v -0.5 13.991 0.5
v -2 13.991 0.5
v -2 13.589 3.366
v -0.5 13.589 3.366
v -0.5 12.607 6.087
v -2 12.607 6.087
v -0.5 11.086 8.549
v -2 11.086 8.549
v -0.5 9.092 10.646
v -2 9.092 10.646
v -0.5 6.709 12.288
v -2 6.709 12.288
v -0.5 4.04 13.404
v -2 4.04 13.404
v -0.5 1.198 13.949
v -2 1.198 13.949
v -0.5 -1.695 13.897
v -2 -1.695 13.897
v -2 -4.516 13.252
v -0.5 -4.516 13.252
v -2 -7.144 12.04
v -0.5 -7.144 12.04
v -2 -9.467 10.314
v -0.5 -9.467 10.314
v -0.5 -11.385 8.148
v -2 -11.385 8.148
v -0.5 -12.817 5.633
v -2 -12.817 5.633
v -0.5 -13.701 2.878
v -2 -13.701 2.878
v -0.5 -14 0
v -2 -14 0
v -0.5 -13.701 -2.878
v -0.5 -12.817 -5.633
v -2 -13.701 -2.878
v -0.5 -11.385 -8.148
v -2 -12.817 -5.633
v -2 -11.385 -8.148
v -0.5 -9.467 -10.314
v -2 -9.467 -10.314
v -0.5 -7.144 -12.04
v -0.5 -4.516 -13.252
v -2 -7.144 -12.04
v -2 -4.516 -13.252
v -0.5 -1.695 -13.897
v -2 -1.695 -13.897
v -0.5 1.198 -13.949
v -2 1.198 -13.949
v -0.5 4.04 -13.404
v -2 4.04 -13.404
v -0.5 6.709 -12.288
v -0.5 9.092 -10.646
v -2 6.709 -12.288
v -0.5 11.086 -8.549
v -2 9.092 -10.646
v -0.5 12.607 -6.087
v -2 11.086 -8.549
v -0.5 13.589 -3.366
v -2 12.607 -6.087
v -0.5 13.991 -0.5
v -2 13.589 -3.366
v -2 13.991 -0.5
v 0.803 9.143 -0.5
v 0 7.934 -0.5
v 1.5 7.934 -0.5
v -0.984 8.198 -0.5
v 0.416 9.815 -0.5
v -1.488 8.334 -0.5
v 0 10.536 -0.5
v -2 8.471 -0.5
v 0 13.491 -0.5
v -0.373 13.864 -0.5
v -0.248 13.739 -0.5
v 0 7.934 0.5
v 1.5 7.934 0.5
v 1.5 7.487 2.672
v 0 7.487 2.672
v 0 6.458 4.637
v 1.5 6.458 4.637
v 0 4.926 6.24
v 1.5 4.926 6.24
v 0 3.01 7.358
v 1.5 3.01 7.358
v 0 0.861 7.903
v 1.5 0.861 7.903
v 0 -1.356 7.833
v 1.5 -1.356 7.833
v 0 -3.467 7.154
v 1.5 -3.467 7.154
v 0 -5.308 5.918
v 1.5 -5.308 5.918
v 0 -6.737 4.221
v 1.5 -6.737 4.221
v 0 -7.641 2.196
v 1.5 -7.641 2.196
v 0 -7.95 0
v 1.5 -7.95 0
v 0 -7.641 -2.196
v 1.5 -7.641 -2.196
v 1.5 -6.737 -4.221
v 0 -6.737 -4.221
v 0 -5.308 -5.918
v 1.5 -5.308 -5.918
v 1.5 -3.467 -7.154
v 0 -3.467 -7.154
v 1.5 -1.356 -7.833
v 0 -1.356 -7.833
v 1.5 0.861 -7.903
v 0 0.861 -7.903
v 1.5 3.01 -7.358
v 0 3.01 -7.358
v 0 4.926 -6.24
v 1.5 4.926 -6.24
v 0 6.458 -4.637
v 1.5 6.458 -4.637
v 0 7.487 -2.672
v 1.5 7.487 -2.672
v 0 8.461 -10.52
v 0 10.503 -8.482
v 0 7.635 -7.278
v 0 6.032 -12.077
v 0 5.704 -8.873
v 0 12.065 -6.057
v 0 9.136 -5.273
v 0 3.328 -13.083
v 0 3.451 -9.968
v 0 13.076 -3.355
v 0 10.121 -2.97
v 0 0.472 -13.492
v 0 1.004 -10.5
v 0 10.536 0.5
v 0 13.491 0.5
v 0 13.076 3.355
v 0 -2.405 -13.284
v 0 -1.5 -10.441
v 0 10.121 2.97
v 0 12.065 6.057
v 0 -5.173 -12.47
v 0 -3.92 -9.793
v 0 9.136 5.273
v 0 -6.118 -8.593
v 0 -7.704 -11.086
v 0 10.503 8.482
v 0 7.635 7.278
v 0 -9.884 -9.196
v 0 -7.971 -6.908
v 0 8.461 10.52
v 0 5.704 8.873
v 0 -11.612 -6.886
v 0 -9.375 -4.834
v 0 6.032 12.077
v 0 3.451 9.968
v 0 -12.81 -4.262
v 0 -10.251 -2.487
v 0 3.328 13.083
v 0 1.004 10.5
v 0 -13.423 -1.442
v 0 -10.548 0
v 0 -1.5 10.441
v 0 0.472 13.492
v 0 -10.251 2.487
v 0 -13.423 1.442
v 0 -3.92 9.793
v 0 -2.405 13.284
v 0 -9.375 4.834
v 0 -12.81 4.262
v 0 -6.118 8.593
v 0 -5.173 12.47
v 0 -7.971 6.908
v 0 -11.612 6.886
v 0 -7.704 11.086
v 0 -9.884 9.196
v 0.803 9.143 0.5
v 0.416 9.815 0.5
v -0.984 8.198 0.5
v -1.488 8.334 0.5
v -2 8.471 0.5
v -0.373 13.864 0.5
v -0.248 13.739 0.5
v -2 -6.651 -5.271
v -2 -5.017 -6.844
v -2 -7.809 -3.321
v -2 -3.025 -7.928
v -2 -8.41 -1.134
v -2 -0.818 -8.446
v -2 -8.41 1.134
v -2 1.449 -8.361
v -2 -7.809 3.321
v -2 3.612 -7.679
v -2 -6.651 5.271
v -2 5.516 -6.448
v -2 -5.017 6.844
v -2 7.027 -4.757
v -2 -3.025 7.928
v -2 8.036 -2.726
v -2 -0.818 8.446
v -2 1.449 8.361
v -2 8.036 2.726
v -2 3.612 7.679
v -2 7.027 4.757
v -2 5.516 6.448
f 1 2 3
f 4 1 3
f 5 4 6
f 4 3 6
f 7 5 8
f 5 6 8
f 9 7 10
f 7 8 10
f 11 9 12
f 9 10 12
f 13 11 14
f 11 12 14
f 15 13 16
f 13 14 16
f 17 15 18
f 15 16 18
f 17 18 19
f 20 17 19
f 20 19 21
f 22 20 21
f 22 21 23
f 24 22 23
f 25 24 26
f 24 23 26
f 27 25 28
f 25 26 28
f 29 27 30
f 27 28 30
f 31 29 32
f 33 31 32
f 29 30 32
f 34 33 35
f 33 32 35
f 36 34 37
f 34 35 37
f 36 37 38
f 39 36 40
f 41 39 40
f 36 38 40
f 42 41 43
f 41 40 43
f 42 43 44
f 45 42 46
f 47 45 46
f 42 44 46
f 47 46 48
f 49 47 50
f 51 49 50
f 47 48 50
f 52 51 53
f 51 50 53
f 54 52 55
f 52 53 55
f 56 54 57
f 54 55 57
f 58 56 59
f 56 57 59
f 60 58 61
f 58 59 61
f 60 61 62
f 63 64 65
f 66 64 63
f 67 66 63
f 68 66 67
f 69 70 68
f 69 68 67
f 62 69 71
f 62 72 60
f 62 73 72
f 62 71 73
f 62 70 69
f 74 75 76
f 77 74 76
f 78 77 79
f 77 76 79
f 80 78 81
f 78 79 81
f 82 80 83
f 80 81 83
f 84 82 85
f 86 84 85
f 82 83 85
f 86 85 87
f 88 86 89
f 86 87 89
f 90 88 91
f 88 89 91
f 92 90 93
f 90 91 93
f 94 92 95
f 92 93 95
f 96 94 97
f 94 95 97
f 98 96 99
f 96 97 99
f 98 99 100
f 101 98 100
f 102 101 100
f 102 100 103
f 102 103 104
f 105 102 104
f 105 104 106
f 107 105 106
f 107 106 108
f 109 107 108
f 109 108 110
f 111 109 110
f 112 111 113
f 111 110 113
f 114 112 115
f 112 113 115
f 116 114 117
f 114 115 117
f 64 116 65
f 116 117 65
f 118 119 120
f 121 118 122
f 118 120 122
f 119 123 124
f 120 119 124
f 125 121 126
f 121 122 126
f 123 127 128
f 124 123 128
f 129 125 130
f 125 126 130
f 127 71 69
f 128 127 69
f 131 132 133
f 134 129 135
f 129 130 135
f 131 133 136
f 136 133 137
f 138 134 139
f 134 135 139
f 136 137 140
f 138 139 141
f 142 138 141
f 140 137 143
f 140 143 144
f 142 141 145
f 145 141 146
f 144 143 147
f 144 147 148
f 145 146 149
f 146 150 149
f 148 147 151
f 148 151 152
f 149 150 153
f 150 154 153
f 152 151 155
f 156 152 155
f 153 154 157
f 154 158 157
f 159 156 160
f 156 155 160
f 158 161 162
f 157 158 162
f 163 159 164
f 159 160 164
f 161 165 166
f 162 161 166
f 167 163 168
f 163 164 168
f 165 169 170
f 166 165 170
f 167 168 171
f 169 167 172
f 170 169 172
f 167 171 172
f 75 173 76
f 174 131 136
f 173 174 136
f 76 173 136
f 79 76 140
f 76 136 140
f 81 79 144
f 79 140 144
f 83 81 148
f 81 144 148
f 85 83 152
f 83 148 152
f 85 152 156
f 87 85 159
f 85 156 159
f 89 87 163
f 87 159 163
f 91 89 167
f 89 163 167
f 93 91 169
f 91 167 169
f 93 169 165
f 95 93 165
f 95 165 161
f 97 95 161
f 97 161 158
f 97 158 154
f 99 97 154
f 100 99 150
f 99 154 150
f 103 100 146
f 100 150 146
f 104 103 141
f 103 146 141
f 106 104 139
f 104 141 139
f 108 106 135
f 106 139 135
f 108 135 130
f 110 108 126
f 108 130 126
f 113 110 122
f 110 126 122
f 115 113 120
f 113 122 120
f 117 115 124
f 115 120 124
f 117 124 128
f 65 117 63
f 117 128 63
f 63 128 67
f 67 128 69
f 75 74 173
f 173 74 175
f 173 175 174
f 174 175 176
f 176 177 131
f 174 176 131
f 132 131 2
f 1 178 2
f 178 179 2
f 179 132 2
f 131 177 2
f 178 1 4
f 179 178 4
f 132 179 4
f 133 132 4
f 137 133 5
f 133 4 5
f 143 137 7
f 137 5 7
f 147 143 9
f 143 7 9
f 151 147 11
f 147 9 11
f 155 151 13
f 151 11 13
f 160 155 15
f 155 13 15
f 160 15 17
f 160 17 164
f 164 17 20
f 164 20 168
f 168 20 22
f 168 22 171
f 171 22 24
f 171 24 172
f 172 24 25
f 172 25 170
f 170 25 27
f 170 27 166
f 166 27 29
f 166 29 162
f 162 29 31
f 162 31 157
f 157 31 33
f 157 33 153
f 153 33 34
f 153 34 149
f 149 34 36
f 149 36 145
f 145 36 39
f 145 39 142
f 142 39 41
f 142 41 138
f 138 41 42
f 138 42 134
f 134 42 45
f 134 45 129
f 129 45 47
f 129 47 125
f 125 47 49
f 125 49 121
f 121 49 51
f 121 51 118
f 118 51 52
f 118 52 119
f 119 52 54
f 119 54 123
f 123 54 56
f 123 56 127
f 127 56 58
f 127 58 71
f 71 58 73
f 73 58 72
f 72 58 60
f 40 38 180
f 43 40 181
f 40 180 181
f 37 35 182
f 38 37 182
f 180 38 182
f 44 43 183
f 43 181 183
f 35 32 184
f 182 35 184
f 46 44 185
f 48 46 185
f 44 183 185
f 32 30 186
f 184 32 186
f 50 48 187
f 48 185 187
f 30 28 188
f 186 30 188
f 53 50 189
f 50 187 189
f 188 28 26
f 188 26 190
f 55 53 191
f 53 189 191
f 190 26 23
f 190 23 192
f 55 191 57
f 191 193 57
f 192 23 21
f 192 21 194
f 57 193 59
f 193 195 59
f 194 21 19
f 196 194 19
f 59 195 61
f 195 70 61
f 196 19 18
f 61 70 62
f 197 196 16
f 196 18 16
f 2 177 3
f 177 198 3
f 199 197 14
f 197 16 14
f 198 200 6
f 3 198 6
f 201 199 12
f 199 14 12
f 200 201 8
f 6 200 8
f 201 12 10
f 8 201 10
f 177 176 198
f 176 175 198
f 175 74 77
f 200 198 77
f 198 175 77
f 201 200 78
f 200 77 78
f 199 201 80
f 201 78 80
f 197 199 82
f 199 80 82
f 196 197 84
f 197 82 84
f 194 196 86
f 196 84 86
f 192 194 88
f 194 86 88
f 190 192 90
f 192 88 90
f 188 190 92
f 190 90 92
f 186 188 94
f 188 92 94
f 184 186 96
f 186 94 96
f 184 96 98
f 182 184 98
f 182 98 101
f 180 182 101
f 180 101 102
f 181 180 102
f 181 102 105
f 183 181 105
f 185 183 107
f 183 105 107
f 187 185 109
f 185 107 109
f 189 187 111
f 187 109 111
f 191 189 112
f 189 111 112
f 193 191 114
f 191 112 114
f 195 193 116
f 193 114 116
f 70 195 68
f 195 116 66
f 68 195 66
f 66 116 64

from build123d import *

# Parameters (mm, degrees)
CHAMFER_1_SIZE      = 0.5
SKETCH_2_W          = 1
SKETCH_2_H          = 14.5
CUT_EXTRUDE_2_DEPTH = 4.5


with BuildPart() as part:
    # Эскиз1 → Повернуть1 (revolve)
    with BuildSketch(Plane.XY):
        Polygon((0, 7.95), (1.5, 7.95), (0, 10.548076211), (0, 14), (-2, 14), (-2, 8.485898385), align=None)
    revolve(axis=Axis((-6.176798117, 0, 0), (1, 0, 0)))

    # Фаска1
    chamfer_1_edges = [part.edges().sort_by_distance(p)[0] for p in [
        (0, -14, 0),
    ]]
    chamfer(chamfer_1_edges, length=CHAMFER_1_SIZE)

    # Эскиз2 → Вырез-Вытянуть2 (cut, through all)
    with BuildSketch(Plane.ZY.offset(2)):
        with Locations((0, 7.25)):
            Rectangle(SKETCH_2_W, SKETCH_2_H)
    extrude(amount=-CUT_EXTRUDE_2_DEPTH, mode=Mode.SUBTRACT)


solid = part.part
